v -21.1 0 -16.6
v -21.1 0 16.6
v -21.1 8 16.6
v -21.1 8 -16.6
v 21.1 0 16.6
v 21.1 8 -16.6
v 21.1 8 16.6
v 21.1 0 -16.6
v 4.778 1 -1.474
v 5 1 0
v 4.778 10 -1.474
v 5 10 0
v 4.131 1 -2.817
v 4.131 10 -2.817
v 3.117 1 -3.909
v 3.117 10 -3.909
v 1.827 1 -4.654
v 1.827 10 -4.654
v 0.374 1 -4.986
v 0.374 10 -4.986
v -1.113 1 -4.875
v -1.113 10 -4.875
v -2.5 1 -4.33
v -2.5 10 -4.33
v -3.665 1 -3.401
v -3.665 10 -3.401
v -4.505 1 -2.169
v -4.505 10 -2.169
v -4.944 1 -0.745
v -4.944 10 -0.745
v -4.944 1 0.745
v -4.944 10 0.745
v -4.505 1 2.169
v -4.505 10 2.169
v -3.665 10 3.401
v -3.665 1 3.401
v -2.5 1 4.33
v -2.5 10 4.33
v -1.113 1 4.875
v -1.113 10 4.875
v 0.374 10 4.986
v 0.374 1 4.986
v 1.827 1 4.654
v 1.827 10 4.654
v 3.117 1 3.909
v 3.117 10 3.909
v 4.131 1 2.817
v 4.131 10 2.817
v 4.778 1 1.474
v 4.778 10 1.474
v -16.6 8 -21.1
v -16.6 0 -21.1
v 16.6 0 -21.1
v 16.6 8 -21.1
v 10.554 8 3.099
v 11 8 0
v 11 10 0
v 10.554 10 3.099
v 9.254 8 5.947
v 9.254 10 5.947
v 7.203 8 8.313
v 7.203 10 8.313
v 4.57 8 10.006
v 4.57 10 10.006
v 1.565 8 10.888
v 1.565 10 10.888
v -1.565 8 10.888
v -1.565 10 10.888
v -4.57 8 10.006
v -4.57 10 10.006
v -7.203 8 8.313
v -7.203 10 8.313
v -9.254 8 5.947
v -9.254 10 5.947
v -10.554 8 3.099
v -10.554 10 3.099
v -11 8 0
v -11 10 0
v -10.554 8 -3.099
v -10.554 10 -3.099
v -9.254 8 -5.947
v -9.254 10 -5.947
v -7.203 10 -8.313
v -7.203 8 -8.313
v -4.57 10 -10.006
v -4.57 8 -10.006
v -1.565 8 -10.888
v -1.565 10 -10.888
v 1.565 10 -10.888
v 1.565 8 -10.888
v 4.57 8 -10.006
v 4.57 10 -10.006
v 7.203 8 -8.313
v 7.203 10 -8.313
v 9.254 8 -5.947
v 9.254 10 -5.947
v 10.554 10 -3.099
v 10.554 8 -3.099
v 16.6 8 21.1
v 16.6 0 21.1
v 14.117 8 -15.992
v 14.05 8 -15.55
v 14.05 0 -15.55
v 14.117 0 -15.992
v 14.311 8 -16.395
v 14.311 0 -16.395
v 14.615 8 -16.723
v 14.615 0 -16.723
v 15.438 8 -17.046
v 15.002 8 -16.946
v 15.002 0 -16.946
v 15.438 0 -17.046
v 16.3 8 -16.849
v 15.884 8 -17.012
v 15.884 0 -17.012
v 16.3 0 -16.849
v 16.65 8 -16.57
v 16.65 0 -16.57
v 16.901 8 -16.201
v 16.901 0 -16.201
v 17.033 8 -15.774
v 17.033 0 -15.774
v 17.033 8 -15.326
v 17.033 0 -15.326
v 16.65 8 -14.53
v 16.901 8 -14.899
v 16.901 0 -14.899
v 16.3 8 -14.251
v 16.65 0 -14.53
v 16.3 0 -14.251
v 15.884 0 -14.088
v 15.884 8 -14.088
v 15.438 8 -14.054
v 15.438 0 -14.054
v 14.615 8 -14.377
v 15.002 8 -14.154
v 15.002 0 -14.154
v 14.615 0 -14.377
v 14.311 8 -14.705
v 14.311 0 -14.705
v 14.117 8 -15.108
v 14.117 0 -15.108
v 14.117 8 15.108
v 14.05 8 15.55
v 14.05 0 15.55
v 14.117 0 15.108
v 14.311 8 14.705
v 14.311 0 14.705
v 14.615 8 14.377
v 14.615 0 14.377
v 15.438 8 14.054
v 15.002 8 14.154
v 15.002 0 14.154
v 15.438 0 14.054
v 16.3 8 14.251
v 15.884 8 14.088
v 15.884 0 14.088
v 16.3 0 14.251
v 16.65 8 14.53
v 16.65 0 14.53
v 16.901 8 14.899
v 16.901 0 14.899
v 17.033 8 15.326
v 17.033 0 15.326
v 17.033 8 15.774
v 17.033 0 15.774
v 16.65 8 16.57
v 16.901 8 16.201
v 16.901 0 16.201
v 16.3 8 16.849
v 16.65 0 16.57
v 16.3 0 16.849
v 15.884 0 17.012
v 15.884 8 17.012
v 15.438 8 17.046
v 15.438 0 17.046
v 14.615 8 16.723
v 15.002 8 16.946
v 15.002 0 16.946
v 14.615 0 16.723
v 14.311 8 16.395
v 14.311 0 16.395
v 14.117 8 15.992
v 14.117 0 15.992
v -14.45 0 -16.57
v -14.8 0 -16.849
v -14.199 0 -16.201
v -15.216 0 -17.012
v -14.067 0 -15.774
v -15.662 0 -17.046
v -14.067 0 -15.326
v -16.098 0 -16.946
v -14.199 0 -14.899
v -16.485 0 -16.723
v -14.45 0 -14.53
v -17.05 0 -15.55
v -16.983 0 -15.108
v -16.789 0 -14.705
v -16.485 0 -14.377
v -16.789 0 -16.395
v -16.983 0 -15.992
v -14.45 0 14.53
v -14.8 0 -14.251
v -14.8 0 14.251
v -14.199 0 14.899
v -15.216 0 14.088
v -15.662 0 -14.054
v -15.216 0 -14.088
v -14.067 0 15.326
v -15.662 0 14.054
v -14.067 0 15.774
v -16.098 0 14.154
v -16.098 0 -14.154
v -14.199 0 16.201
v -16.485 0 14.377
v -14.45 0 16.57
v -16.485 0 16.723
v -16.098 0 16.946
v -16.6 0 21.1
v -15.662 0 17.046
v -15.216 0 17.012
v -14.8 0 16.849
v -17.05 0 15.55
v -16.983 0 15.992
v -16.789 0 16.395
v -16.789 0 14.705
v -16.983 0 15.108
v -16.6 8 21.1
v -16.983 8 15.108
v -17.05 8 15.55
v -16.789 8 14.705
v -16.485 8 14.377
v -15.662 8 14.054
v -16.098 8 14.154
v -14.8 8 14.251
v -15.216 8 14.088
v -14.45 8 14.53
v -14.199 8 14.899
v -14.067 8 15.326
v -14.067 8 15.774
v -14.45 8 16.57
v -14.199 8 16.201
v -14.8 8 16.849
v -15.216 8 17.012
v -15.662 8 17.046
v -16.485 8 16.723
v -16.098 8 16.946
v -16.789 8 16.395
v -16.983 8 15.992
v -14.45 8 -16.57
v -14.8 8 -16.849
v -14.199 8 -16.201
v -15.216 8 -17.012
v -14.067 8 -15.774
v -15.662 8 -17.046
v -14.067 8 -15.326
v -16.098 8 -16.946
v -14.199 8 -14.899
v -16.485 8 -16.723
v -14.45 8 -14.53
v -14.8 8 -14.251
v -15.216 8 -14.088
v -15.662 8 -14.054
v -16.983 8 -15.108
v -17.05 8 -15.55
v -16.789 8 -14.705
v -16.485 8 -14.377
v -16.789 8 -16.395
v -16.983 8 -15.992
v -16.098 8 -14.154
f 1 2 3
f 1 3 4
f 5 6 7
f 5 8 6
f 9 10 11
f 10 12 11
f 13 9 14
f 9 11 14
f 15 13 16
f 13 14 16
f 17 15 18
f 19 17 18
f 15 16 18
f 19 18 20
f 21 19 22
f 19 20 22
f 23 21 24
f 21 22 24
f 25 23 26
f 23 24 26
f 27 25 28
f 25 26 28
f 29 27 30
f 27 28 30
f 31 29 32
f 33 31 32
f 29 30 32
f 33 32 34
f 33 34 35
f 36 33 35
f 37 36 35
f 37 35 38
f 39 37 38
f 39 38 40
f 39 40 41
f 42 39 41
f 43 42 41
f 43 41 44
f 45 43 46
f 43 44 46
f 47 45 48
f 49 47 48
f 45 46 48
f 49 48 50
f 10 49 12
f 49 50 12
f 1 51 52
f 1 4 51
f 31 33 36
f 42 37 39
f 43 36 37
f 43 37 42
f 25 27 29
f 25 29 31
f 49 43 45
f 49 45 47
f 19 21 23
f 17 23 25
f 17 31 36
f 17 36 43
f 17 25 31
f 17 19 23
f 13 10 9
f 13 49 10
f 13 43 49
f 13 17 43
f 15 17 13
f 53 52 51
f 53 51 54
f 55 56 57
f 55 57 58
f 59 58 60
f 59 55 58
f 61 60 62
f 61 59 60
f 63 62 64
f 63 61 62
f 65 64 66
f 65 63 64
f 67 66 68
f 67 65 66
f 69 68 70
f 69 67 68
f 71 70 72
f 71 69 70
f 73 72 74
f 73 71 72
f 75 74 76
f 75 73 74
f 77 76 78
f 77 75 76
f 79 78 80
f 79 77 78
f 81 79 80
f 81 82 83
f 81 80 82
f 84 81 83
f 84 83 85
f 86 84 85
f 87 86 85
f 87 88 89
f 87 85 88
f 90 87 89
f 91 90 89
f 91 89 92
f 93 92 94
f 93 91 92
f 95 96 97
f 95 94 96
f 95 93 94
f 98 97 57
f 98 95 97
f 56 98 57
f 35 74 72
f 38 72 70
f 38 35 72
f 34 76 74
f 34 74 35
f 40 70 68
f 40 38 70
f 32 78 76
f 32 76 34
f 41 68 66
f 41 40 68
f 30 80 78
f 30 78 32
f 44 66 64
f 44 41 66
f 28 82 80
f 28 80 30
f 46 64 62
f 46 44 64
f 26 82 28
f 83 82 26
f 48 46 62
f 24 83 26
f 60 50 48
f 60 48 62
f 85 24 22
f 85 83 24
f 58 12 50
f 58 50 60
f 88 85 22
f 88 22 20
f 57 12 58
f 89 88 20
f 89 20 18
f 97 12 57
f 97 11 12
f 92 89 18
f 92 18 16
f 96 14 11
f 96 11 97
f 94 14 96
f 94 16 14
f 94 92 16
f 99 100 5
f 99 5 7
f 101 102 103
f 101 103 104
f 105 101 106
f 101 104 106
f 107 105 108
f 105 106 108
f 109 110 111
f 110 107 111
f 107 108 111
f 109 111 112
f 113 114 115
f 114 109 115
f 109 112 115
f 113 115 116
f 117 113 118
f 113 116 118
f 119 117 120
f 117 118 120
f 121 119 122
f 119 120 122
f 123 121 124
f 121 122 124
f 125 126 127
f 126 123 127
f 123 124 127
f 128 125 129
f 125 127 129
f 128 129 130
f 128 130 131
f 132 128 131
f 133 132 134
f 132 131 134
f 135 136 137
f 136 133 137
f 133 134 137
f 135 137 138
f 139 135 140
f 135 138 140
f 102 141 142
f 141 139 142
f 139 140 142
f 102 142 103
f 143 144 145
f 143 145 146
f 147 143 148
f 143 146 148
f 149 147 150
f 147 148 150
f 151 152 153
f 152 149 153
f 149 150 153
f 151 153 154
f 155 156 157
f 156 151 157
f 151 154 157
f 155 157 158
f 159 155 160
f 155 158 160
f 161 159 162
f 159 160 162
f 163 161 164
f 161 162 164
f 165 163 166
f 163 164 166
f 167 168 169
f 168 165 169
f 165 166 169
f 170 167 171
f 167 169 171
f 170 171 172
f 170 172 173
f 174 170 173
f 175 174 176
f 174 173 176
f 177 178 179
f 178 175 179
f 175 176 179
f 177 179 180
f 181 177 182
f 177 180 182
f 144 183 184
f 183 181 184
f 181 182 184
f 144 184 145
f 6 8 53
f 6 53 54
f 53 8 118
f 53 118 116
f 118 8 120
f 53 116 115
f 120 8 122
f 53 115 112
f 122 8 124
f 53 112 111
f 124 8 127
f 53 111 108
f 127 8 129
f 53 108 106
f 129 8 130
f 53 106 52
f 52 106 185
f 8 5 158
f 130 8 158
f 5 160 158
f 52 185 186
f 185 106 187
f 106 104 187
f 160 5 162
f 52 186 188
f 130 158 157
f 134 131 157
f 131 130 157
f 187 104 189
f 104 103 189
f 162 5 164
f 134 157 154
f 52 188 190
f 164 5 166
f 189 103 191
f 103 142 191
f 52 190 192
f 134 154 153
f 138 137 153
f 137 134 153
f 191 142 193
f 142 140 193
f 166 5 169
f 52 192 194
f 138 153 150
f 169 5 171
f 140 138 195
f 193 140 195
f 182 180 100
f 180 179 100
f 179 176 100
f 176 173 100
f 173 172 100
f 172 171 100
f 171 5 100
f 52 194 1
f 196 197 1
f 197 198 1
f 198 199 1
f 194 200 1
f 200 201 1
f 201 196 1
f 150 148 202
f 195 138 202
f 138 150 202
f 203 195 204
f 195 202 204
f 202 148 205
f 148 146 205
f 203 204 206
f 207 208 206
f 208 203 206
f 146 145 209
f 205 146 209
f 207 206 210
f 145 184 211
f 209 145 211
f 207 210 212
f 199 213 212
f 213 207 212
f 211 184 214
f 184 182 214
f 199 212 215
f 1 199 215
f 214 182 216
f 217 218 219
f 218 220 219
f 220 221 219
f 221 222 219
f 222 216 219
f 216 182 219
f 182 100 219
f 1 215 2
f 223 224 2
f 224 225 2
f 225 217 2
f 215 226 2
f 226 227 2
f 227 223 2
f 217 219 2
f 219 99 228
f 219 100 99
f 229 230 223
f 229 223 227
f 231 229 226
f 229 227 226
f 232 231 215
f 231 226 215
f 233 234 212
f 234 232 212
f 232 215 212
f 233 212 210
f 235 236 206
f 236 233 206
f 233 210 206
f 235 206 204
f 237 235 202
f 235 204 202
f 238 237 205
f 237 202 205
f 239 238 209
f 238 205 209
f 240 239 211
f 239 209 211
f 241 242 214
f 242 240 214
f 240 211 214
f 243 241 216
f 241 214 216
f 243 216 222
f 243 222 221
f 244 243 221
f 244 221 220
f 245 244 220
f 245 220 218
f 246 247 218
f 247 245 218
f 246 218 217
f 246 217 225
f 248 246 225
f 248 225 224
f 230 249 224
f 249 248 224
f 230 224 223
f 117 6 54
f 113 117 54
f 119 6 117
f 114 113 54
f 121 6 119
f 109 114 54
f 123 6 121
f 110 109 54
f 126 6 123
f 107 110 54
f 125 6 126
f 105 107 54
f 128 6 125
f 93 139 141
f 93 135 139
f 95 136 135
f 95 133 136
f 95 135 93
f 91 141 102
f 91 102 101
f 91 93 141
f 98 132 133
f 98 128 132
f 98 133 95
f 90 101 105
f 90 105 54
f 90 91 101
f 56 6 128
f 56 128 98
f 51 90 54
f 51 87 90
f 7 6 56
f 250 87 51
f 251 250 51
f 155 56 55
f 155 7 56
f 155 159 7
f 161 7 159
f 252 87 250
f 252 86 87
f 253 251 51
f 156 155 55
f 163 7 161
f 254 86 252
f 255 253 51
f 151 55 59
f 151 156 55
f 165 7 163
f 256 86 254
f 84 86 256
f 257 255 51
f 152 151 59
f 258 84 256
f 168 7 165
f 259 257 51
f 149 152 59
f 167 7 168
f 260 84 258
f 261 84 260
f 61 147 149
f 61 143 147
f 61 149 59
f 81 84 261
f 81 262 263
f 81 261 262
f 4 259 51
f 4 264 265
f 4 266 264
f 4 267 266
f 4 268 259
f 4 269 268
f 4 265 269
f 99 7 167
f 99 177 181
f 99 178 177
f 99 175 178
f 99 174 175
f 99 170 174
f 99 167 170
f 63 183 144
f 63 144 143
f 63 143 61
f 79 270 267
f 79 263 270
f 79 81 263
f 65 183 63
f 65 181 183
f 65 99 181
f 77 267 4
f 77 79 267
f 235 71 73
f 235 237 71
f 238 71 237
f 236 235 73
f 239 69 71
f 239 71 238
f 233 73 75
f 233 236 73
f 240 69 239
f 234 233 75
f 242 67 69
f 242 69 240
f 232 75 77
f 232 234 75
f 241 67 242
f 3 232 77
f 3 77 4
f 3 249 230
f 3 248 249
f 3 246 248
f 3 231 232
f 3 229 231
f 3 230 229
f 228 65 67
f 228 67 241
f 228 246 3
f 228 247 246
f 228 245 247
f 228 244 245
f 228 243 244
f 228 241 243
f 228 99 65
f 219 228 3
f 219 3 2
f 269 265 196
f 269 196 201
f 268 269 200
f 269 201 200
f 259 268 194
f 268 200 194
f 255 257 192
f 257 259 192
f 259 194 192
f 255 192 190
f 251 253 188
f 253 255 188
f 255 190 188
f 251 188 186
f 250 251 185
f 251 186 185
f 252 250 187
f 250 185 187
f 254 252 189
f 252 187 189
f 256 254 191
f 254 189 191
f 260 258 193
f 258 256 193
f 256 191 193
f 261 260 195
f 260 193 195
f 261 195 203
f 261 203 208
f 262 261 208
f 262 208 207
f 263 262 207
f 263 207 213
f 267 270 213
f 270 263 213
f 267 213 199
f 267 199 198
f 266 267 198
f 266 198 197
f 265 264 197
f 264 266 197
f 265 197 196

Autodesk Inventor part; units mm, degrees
ref_plane "YZ Plane" through (0, 0, 0) normal (1, 0, 0) x (0, 1, 0)
ref_plane "XZ Plane" through (0, 0, 0) normal (0, 1, 0) x (-1, 0, 0)
ref_plane "XY Plane" through (0, 0, 0) normal (0, 0, 1) x (1, 0, 0)
sketch "Эскиз1" plane through (0, 0, 0) normal (0, 1, 0) x (-1, 0, 0)
  line L0 (21.1, -21.1) -> (-21.1, -21.1)
  line L1 (-21.1, -21.1) -> (-21.1, 21.1)
  line L2 (-21.1, 21.1) -> (21.1, 21.1)
  line L3 (21.1, 21.1) -> (21.1, -21.1)
  line L4 (21.1, -21.1) -> (-21.1, 21.1) construction
  line L5 (-21.1, -21.1) -> (21.1, 21.1) construction
  line L6 (-15.55, 15.55) -> (15.55, 15.55) construction
  line L7 (15.55, 15.55) -> (15.55, -15.55) construction
  line L8 (15.55, -15.55) -> (-15.55, -15.55) construction
  line L9 (-15.55, -15.55) -> (-15.55, 15.55) construction
  line L10 (-15.55, 15.55) -> (15.55, -15.55) construction
  line L11 (15.55, 15.55) -> (-15.55, -15.55) construction
  circle A0 centre (-15.55, -15.55) radius 1.5
  circle A1 centre (15.55, -15.55) radius 1.5
  circle A2 centre (15.55, 15.55) radius 1.5
  circle A3 centre (-15.55, 15.55) radius 1.5
  point P0 (0, 0)
  dimension "d0" = 42.2
  dimension "d1" = 42.2
  dimension "d2" = 31.1
  dimension "d3" = 31.1
  dimension "d4" = 3
  dimension "d5" = 3
  dimension "d6" = 3
  dimension "d7" = 3
extrude "Выдавливание1" add sketch "Эскиз1" along normal blind 8
sketch "Эскиз2" plane through (0, 8, 0) normal (0, 1, 0) x (1, 0, 0)
  circle A0 centre (0, 0) radius 11
  dimension "d10" = 22
extrude "Выдавливание2" add sketch "Эскиз2" along normal blind 2
chamfer "Фаска1" distance 4.5 angle 45 4 edges at (21.1, 4, -21.1) (21.1, 4, 21.1) (-21.1, 4, 21.1) (-21.1, 4, -21.1)
sketch "Эскиз3" plane through (0, 10, 0) normal (0, 1, 0) x (1, 0, 0)
  circle A0 centre (0, 0) radius 11 projected
  circle A1 centre (0, 0) radius 5
  dimension "d16" = 10
extrude "Выдавливание3" cut sketch "Эскиз3" against normal blind 9 contours A1
thread "Резьба1" size "M3x0.5" class "6H" standard "ANSI Metric M Profile" full length
thread "Резьба2" size "M3x0.5" class "6H" standard "ANSI Metric M Profile" full length
thread "Резьба3" size "M3x0.5" class "6H" standard "ANSI Metric M Profile" full length
thread "Резьба4" size "M3x0.5" class "6H" standard "ANSI Metric M Profile" full length
properties part number "Top"
